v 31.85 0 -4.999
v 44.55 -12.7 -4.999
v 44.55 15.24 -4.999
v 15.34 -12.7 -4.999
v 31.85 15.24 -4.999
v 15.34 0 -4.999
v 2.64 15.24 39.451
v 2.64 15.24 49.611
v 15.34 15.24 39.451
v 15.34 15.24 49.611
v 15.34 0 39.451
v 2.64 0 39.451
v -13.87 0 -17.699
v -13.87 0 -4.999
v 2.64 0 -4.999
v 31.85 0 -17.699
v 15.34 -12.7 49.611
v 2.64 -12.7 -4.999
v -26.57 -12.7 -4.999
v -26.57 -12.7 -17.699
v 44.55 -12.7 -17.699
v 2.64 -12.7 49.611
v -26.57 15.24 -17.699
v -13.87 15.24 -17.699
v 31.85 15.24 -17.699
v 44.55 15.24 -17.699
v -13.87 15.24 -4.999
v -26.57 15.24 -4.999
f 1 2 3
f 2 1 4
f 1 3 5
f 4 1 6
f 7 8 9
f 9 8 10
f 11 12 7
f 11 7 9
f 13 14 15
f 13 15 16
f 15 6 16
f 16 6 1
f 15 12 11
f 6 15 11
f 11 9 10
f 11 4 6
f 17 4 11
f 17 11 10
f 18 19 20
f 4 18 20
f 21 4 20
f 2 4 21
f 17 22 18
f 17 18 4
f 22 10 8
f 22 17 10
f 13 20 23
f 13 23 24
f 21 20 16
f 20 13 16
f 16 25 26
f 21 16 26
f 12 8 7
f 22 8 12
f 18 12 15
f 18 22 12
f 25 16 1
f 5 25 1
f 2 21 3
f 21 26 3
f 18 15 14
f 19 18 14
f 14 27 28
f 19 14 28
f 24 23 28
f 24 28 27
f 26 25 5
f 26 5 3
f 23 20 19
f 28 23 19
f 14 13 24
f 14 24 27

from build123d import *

# Parameters (mm, degrees)
F0_W     = 12.7
F0_H     = 12.7
F0_W_2   = 6.35
F0_H_2   = 17.78
F1_DEPTH = 12.7
F2_DEPTH = 15.24


with BuildPart() as f1:
    # F0 (on Front) → F1 (new body)
    with BuildSketch(Plane.XZ):
        with Locations((-20.219863, -11.348728)):
            Rectangle(F0_W, F0_H)
        with Locations((38.200137, -11.348728)):
            Rectangle(F0_W, F0_H)
        Polygon((2.640137, -4.998728), (-13.869863, -4.998728), (-13.869863, -17.698728), (31.850137, -17.698728), (31.850137, -4.998728), (15.340137, -4.998728), align=None)
        Polygon((8.990137, 21.671272), (2.640137, 21.671272), (2.640137, -4.998728), (15.340137, -4.998728), (15.340137, 21.671272), align=None)
        with Locations((12.165137, 30.561272)):
            Rectangle(F0_W_2, F0_H_2)
        with Locations((5.815137, 30.561272)):
            Rectangle(F0_W_2, F0_H_2)
        Polygon((2.640137, 49.611272), (2.640137, 39.451272), (8.990137, 39.451272), (15.340137, 39.451272), (15.340137, 49.611272), align=None)
    extrude(amount=F1_DEPTH)

    # F0 (on Front) → F2 (join)
    with BuildSketch(Plane.XZ):
        Polygon((2.640137, 49.611272), (2.640137, 39.451272), (8.990137, 39.451272), (15.340137, 39.451272), (15.340137, 49.611272), align=None)
        with Locations((-20.219863, -11.348728)):
            Rectangle(F0_W, F0_H)
        with Locations((38.200137, -11.348728)):
            Rectangle(F0_W, F0_H)
    extrude(amount=-F2_DEPTH)


solid = f1.part
